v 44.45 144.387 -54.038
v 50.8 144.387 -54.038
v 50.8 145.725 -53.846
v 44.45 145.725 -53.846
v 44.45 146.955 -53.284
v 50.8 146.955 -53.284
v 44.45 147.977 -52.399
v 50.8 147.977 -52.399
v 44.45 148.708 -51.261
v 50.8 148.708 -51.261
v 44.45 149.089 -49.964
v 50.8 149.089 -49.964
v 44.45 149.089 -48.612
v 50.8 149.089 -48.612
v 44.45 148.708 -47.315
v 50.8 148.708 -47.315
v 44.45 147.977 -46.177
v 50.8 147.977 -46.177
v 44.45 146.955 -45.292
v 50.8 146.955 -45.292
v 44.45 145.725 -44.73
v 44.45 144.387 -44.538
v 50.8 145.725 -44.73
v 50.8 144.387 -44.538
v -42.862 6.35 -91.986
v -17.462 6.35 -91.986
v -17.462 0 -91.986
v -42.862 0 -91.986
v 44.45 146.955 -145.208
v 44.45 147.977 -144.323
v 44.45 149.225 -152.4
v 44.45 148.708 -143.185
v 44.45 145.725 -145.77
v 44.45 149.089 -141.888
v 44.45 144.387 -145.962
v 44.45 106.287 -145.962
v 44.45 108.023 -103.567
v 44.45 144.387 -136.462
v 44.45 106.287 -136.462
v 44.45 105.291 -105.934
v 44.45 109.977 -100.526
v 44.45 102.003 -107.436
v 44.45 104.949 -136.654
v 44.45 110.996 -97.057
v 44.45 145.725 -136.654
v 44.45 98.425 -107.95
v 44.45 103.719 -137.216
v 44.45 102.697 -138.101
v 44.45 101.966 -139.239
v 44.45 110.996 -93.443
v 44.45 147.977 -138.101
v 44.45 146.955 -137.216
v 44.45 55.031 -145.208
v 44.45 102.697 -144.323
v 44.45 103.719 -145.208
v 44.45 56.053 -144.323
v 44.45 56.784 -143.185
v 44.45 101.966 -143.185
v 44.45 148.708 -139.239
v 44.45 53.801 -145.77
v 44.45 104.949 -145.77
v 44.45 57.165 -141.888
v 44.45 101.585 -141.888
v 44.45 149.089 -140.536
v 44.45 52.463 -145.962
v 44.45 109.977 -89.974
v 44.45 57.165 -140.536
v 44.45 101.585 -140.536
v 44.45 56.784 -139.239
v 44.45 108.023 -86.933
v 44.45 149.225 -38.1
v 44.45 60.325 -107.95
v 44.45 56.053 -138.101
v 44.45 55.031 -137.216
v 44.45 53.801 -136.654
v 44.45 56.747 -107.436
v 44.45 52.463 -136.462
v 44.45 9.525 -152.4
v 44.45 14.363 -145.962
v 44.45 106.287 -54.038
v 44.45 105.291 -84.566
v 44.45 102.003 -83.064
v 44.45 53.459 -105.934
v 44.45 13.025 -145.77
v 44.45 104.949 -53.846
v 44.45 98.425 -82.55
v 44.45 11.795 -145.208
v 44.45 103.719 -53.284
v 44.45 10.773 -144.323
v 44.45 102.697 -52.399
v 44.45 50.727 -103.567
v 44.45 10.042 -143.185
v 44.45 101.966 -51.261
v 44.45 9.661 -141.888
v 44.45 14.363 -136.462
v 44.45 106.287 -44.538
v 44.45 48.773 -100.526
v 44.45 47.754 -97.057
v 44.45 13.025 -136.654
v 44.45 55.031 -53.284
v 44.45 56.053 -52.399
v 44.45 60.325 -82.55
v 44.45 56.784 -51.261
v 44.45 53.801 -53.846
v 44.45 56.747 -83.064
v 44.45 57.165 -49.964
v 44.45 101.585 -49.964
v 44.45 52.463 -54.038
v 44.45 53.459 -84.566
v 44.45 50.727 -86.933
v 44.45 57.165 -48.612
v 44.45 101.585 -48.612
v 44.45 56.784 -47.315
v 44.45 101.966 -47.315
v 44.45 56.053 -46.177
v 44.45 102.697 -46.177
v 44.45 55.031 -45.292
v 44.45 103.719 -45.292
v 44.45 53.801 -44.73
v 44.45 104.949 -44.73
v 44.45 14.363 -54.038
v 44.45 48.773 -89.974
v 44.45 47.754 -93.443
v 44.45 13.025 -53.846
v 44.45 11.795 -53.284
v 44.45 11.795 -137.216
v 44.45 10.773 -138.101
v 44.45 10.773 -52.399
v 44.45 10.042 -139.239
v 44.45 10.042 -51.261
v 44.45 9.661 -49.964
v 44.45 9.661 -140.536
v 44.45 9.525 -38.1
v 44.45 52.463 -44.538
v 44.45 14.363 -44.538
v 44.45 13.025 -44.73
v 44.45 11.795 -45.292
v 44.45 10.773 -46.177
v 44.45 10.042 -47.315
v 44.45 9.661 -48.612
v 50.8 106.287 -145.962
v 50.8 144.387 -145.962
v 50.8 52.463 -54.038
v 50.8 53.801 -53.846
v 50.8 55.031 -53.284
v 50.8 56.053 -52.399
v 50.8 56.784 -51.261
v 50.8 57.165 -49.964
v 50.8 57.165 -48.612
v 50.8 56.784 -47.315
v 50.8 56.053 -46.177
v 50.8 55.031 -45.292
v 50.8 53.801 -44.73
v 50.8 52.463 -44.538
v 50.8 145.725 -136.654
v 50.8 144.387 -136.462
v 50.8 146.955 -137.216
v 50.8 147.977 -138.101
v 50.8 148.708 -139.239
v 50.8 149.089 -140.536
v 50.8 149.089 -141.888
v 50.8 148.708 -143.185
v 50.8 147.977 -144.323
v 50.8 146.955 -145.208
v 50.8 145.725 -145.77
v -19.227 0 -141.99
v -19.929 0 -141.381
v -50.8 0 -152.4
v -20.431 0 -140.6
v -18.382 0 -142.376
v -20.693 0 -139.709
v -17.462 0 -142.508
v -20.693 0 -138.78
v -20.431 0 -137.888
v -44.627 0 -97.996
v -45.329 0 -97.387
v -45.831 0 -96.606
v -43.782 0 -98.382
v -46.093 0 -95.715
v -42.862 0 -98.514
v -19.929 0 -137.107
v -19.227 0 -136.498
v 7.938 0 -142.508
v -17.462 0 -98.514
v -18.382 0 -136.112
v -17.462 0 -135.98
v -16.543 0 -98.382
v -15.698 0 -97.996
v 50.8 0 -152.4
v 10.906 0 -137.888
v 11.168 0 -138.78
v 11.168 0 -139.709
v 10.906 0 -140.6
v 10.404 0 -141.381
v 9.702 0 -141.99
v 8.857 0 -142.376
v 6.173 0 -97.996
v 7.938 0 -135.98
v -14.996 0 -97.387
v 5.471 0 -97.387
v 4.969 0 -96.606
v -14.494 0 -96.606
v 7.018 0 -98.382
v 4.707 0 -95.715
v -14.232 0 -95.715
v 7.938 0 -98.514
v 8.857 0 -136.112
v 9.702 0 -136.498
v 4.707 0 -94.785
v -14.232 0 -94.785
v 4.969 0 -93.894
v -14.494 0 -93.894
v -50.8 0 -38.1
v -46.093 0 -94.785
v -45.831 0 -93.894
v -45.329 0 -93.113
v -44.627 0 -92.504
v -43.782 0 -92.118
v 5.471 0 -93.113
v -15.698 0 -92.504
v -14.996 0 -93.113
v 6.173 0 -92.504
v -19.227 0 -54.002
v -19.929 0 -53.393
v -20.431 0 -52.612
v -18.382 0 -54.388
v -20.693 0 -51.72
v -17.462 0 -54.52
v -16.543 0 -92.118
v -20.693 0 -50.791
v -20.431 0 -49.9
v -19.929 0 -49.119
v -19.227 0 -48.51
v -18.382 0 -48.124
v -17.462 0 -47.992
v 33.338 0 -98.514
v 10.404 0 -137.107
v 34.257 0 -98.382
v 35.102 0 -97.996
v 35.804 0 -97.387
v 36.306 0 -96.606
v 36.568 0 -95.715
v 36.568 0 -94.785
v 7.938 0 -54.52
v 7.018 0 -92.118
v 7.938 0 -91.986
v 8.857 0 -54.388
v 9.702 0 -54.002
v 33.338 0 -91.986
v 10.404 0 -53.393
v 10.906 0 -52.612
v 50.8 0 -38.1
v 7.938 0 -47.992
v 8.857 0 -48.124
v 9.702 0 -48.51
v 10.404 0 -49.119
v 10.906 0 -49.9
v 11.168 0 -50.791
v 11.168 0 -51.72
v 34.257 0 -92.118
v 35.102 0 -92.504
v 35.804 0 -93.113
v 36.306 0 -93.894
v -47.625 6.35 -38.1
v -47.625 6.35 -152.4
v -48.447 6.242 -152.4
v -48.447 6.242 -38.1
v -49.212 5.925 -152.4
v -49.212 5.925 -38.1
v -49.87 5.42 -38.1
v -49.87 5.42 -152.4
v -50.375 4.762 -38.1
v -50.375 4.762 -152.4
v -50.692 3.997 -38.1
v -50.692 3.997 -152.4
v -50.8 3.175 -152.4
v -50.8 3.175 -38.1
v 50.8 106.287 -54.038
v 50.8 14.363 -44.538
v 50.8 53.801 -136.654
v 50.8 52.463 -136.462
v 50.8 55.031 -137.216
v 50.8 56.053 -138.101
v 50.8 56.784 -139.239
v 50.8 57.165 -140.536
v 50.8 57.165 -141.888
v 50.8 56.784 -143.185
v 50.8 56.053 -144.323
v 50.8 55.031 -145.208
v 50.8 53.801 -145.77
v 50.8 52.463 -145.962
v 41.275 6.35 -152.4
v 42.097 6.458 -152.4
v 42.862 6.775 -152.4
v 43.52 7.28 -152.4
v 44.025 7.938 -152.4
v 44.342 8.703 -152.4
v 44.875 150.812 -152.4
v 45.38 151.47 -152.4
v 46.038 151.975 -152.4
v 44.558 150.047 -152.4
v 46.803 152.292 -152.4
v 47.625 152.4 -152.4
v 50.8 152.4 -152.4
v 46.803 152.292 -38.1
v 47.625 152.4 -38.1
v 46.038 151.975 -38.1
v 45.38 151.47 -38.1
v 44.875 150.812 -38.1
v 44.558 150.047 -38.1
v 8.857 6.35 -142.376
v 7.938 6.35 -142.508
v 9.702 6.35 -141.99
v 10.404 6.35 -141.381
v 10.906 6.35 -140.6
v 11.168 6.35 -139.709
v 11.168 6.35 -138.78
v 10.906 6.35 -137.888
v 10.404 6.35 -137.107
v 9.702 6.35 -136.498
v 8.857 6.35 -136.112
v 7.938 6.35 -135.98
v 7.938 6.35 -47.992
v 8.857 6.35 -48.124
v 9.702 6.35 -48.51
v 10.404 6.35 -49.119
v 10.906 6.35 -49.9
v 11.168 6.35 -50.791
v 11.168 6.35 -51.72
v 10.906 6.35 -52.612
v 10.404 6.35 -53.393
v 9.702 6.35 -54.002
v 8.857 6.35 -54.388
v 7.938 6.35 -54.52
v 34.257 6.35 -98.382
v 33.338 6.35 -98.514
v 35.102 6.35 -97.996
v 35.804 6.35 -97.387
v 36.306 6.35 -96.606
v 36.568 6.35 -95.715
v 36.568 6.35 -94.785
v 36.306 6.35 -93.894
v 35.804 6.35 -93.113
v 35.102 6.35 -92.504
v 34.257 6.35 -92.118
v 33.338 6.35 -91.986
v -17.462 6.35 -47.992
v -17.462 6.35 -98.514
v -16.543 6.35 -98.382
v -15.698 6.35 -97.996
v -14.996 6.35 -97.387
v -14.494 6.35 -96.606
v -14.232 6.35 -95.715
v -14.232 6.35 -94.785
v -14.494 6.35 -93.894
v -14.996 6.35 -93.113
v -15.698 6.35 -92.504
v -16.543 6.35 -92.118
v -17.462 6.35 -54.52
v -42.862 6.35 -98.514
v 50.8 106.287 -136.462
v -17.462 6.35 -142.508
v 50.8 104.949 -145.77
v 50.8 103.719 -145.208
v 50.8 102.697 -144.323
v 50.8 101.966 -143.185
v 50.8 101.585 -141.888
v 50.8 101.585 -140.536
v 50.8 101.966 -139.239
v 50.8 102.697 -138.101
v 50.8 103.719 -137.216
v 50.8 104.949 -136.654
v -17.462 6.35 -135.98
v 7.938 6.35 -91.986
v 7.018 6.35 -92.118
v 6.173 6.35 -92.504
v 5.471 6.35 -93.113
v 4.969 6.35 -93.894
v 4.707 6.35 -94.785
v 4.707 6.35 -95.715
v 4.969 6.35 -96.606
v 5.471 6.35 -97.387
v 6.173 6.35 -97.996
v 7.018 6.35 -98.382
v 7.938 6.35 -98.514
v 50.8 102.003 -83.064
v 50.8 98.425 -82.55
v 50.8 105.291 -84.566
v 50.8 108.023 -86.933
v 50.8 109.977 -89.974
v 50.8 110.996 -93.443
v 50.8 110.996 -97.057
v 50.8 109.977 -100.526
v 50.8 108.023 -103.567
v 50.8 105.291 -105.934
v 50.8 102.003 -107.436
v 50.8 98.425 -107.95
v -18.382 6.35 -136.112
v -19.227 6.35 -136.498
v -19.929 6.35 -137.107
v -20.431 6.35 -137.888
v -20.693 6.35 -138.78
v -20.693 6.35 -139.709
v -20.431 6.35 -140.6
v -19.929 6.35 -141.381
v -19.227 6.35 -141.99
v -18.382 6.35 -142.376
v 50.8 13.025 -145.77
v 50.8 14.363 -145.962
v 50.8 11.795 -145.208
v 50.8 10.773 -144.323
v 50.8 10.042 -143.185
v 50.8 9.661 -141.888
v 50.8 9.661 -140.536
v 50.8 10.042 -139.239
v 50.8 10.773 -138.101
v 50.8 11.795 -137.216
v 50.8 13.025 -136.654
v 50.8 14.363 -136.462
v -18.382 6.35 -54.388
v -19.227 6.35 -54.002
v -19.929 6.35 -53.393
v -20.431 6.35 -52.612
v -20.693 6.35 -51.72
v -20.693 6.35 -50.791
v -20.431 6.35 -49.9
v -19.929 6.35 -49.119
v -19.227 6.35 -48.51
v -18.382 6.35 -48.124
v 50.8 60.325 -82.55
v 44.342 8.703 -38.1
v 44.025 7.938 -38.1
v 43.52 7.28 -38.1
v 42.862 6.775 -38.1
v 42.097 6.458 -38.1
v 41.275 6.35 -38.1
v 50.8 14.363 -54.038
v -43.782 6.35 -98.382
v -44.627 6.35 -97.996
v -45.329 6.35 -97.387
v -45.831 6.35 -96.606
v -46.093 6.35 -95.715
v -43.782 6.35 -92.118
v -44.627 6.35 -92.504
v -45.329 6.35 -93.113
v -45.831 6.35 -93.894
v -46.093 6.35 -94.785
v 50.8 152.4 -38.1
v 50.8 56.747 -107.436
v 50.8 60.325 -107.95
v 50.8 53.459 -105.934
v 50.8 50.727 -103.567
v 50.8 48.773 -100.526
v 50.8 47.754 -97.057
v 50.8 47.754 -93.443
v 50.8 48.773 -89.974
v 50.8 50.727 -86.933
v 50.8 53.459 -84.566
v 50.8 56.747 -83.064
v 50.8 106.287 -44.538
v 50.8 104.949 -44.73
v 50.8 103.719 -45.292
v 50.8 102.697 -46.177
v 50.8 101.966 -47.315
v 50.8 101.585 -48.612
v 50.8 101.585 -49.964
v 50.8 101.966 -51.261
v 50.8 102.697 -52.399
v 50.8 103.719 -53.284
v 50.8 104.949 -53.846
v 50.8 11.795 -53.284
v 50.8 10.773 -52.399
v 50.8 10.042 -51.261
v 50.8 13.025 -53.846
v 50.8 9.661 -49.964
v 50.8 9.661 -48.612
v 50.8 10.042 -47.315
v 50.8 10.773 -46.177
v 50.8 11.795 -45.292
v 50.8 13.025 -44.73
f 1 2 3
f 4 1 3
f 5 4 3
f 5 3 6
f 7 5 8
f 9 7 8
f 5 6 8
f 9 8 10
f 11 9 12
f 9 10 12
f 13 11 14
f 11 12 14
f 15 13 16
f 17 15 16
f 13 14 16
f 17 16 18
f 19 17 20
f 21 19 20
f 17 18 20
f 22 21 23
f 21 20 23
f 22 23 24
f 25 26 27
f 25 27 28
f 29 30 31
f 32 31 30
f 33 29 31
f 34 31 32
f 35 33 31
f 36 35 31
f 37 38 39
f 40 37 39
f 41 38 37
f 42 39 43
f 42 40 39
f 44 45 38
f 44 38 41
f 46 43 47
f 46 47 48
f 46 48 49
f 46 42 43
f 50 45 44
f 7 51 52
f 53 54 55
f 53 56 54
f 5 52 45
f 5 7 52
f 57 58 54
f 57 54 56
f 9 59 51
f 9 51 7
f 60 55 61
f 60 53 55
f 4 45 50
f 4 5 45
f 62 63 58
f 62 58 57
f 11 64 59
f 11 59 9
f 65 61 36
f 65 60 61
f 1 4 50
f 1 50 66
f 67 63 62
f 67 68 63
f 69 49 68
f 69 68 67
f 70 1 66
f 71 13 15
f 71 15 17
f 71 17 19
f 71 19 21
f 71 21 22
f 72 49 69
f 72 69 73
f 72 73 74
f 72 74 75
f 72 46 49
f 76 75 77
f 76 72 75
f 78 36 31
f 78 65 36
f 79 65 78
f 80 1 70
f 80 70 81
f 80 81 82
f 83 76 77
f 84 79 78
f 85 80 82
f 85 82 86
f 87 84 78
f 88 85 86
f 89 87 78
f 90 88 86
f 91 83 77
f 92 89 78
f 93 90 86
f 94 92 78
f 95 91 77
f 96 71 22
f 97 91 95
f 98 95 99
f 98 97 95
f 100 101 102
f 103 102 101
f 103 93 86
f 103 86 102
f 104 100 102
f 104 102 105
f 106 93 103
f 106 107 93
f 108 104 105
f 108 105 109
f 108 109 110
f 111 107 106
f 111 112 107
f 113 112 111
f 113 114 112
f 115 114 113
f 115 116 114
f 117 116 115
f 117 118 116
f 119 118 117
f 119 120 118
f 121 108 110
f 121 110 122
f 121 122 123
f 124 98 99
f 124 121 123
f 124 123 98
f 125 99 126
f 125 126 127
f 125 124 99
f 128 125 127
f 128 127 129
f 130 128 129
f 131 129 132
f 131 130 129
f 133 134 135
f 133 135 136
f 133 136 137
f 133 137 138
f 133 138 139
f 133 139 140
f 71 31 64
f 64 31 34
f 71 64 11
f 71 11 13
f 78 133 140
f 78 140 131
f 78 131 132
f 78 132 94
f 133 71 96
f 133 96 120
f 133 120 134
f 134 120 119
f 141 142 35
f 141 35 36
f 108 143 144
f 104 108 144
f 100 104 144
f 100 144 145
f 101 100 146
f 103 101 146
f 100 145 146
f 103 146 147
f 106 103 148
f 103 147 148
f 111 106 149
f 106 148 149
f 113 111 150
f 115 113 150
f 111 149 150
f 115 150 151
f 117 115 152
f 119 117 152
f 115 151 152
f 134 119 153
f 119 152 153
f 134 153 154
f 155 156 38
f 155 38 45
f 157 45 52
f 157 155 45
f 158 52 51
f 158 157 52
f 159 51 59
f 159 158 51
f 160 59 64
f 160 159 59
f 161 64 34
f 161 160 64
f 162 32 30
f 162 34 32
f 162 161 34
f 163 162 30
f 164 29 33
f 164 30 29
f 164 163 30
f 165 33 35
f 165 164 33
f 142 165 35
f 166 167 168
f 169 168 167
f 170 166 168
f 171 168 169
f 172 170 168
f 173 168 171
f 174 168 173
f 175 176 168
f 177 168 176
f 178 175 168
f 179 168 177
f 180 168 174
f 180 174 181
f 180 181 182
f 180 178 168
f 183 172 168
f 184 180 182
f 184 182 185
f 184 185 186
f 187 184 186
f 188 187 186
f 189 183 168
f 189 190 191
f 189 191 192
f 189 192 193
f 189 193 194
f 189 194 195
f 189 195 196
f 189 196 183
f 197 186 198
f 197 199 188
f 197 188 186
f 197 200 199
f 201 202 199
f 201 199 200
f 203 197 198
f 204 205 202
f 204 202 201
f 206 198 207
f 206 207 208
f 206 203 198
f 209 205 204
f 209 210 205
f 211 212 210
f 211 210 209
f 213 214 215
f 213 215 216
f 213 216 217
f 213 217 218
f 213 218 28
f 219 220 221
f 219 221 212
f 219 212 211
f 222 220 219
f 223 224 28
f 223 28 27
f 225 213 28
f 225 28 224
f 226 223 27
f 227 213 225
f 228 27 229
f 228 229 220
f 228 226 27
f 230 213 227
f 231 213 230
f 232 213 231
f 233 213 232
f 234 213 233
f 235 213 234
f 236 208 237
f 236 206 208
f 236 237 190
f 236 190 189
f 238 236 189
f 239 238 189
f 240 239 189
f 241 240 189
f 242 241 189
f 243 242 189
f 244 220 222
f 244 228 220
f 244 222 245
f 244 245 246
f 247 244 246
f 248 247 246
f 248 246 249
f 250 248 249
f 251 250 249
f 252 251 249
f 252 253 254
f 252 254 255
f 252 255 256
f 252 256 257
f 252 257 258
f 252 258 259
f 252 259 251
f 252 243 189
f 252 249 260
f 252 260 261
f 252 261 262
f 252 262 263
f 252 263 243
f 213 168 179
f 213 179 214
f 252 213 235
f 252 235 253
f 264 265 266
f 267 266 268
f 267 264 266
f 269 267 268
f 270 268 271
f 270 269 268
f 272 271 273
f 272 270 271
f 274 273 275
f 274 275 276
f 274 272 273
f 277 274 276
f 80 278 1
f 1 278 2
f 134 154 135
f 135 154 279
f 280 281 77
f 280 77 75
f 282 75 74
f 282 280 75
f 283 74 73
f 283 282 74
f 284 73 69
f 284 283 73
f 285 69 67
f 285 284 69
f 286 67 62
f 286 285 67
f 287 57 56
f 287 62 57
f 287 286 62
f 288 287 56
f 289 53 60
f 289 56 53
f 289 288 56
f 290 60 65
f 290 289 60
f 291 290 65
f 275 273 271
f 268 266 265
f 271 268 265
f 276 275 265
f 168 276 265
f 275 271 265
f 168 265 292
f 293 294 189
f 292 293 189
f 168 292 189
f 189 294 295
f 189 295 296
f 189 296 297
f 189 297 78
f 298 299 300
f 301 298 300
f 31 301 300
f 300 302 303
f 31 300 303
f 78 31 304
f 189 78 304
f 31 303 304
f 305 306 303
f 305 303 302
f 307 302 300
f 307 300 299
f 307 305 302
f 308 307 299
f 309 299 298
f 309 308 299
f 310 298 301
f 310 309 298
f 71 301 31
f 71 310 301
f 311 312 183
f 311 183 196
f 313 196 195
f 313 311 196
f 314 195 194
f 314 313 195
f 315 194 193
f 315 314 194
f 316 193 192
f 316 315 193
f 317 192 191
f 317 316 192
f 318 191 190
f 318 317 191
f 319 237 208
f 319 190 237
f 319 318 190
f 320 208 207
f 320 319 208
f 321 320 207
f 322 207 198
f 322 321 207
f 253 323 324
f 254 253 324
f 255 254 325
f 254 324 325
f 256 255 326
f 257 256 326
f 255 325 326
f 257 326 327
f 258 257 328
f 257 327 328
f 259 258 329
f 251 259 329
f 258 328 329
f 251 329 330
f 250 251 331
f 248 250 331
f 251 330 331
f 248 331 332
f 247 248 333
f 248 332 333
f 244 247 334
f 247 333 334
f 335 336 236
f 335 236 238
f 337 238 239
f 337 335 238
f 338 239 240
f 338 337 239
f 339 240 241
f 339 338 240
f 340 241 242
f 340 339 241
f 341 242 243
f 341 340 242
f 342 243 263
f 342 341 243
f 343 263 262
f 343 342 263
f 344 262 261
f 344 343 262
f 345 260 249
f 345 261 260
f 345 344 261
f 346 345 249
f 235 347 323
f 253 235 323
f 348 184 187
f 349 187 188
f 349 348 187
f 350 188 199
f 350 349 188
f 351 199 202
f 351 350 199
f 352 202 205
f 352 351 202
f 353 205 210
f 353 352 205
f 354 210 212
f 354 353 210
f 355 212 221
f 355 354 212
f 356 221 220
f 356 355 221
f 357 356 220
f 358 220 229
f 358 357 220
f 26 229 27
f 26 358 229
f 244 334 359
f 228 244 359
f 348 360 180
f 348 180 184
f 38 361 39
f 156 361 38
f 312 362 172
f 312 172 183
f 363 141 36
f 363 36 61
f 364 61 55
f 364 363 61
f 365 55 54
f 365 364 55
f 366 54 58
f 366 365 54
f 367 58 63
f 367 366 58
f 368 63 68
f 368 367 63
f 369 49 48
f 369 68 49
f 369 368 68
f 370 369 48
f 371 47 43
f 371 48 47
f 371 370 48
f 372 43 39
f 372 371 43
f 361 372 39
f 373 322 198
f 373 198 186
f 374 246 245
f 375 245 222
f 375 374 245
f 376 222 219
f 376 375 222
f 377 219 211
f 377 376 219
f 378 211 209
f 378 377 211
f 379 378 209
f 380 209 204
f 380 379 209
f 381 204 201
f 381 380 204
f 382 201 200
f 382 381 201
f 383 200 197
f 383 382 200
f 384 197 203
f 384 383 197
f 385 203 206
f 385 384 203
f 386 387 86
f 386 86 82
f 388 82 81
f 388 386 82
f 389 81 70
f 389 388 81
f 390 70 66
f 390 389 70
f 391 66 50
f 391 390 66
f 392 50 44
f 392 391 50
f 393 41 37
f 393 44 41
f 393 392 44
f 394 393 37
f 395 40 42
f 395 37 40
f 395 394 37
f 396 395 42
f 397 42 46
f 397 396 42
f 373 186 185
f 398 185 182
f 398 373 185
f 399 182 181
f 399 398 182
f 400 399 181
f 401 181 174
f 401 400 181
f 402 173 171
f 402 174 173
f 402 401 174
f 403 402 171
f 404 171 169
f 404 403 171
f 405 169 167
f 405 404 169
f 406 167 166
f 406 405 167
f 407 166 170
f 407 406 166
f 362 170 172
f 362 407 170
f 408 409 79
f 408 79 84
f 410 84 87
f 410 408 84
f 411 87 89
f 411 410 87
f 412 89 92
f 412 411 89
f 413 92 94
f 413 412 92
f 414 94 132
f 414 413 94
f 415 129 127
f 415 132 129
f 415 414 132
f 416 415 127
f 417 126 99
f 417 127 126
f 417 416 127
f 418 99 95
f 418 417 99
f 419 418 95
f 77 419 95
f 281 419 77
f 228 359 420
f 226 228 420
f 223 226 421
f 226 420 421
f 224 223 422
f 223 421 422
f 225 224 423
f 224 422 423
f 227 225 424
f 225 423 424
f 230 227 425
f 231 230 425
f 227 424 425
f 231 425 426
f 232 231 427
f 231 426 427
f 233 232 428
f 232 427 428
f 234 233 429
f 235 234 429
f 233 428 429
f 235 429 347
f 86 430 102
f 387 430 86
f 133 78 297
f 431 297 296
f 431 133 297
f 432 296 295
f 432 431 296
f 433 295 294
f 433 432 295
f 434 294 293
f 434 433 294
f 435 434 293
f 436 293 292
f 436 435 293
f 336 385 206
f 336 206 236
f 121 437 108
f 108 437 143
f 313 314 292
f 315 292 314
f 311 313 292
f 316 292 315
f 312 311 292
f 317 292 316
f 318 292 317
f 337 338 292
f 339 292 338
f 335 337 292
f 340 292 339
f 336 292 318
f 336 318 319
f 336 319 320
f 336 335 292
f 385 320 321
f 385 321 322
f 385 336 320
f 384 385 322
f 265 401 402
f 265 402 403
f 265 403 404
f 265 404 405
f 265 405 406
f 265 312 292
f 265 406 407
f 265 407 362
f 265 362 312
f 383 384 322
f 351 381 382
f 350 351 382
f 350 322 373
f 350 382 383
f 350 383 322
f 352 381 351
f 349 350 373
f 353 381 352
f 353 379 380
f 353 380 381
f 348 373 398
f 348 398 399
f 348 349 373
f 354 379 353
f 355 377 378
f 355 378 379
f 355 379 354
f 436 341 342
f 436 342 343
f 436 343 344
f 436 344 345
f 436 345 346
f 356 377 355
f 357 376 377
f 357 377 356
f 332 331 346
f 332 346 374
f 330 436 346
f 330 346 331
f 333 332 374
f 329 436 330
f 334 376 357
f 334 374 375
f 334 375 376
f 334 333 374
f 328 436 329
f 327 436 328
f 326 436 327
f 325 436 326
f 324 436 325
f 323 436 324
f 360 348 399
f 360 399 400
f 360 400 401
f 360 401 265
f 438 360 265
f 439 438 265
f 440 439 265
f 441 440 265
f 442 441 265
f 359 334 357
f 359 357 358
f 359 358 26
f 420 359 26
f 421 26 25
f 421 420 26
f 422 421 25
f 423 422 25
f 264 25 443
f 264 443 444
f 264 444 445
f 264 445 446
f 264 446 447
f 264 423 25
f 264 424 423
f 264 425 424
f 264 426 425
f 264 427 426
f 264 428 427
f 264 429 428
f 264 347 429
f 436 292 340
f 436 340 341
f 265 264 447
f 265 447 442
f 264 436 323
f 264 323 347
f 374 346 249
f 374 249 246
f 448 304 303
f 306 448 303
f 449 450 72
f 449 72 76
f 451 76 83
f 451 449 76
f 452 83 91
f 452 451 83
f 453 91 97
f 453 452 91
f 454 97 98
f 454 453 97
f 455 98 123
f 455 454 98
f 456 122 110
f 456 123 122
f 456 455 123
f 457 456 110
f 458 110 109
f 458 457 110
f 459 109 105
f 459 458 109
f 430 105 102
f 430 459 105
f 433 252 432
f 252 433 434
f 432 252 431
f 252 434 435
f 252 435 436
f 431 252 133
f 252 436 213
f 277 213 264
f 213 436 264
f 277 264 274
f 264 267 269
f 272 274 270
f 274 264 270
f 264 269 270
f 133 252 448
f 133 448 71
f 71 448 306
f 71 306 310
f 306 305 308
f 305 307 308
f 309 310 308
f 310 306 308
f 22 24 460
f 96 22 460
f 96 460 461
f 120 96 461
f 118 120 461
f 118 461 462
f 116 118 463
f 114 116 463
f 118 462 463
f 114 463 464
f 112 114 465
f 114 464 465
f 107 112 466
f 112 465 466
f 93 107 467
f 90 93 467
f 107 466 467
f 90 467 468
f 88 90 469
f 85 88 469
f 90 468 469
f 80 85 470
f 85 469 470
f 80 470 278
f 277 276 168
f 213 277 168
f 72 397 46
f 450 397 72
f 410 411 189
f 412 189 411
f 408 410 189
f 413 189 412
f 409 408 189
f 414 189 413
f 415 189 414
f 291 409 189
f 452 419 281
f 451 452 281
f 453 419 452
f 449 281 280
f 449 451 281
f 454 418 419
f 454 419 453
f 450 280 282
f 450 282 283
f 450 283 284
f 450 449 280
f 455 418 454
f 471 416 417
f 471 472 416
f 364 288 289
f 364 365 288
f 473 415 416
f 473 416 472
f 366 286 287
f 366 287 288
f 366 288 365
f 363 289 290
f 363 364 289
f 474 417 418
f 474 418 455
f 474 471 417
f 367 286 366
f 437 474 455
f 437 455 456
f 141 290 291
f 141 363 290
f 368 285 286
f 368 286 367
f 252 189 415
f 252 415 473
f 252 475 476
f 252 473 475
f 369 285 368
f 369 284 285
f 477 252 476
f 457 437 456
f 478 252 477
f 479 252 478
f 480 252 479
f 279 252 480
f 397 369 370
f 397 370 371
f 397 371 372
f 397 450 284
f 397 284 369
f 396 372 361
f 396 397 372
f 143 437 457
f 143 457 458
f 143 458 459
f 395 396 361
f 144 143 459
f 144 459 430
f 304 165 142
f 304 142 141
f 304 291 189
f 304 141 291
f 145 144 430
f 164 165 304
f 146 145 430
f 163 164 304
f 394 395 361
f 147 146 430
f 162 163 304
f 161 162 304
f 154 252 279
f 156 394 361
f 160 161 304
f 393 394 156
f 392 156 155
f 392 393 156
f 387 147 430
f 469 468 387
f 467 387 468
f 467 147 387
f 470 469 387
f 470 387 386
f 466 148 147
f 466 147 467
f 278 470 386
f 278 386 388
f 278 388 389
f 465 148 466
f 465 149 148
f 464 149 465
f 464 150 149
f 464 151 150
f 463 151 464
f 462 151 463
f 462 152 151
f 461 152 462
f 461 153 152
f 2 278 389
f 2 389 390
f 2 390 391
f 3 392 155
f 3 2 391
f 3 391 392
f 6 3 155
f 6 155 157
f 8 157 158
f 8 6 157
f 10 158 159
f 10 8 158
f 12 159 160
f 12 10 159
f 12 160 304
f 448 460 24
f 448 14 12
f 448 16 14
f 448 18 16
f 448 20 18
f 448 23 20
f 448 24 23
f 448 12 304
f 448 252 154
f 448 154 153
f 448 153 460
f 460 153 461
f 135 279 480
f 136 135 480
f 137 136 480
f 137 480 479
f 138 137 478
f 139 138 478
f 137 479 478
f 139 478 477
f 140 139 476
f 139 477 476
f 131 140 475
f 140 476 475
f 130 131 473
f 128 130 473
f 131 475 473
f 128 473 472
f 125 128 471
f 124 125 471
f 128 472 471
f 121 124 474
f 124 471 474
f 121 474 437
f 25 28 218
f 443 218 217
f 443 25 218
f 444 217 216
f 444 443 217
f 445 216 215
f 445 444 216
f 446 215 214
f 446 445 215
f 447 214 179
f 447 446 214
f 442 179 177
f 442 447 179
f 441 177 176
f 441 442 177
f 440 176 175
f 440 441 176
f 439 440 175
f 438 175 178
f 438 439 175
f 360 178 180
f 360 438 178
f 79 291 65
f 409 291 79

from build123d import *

# Parameters (mm, degrees)
BOSS_EXTRUDE1_DEPTH = 152.4
CUT_EXTRUDE1_DEPTH  = 239.273120599
CUT_EXTRUDE2_DEPTH  = 218.110576665


with BuildPart() as part:
    # Sketch2 → Boss-Extrude1 (new, symmetric)
    with BuildSketch(Plane.XY):
        with BuildLine():
            Line((-50.8, 0), (50.8, 0))
            Line((50.8, 0), (50.8, 152.4))
            Line((50.8, 152.4), (47.625, 152.4))
            ThreePointArc((47.625, 152.4), (45.37993597, 151.47006403), (44.45, 149.225))
            Line((44.45, 149.225), (44.45, 9.525))
            ThreePointArc((44.45, 9.525), (43.52006403, 7.27993597), (41.275, 6.35))
            Line((41.275, 6.35), (-47.625, 6.35))
            ThreePointArc((-47.625, 6.35), (-49.87006403, 5.42006403), (-50.8, 3.175))
            Line((-50.8, 3.175), (-50.8, 0))
        make_face()
    extrude(amount=BOSS_EXTRUDE1_DEPTH, both=True)

    # SurfaceCut1
    split(bisect_by=Plane(origin=(0, 0, -38.1), x_dir=(-1, 0, 0), z_dir=(0, 0, -1)), keep=Keep.TOP)

    # Sketch3 → Cut-Extrude1 (cut, through all)
    with BuildSketch(Plane(origin=(50.8, 0, 0), x_dir=(0, 0, -1), z_dir=(1, 0, 0))):
        with BuildLine():
            Line((145.961940777, 144.386940777), (145.961940777, 106.286940777))
            ThreePointArc((145.961940777, 106.286940777), (141.211940777, 101.536940777), (136.461940777, 106.286940777))
            Line((136.461940777, 106.286940777), (136.461940777, 144.386940777))
            ThreePointArc((136.461940777, 144.386940777), (141.211940777, 149.136940777), (145.961940777, 144.386940777))
        make_face()
        with BuildLine():
            Line((145.961940777, 52.463059223), (145.961940777, 14.363059223))
            ThreePointArc((145.961940777, 14.363059223), (141.211940777, 9.613059223), (136.461940777, 14.363059223))
            Line((136.461940777, 14.363059223), (136.461940777, 52.463059223))
            ThreePointArc((136.461940777, 52.463059223), (141.211940777, 57.213059223), (145.961940777, 52.463059223))
        make_face()
        with BuildLine():
            Line((44.538059223, 52.463059223), (44.538059223, 14.363059223))
            ThreePointArc((44.538059223, 14.363059223), (49.288059223, 9.613059223), (54.038059223, 14.363059223))
            Line((54.038059223, 14.363059223), (54.038059223, 52.463059223))
            ThreePointArc((54.038059223, 52.463059223), (49.288059223, 57.213059223), (44.538059223, 52.463059223))
        make_face()
        with BuildLine():
            Line((44.538059223, 144.386940777), (44.538059223, 106.286940777))
            ThreePointArc((44.538059223, 106.286940777), (49.288059223, 101.536940777), (54.038059223, 106.286940777))
            Line((54.038059223, 106.286940777), (54.038059223, 144.386940777))
            ThreePointArc((54.038059223, 144.386940777), (49.288059223, 149.136940777), (44.538059223, 144.386940777))
        make_face()
        with BuildLine():
            Line((107.95, 98.425), (107.95, 60.325))
            ThreePointArc((107.95, 60.325), (95.25, 47.625), (82.55, 60.325))
            Line((82.55, 60.325), (82.55, 98.425))
            ThreePointArc((82.55, 98.425), (95.25, 111.125), (107.95, 98.425))
        make_face()
    extrude(amount=-CUT_EXTRUDE1_DEPTH, mode=Mode.SUBTRACT)

    # Sketch4 → Cut-Extrude2 (cut, through all)
    with BuildSketch(Plane(origin=(0, 6.35, 0), x_dir=(1, 0, 0), z_dir=(0, 1, 0))):
        with BuildLine():
            Line((-42.8625, 98.5139), (-17.4625, 98.5139))
            ThreePointArc((-17.4625, 98.5139), (-14.1986, 95.25), (-17.4625, 91.9861))
            Line((-17.4625, 91.9861), (-42.8625, 91.9861))
            ThreePointArc((-42.8625, 91.9861), (-46.1264, 95.25), (-42.8625, 98.5139))
        make_face()
        with BuildLine():
            Line((7.9375, 98.5139), (33.3375, 98.5139))
            ThreePointArc((33.3375, 98.5139), (36.6014, 95.25), (33.3375, 91.9861))
            Line((33.3375, 91.9861), (7.9375, 91.9861))
            ThreePointArc((7.9375, 91.9861), (4.6736, 95.25), (7.9375, 98.5139))
        make_face()
        with BuildLine():
            Line((-17.4625, 142.507990512), (7.9375, 142.507990512))
            ThreePointArc((7.9375, 142.507990512), (11.2014, 139.244090512), (7.9375, 135.980190512))
            Line((7.9375, 135.980190512), (-17.4625, 135.980190512))
            ThreePointArc((-17.4625, 135.980190512), (-20.7264, 139.244090512), (-17.4625, 142.507990512))
        make_face()
        with BuildLine():
            Line((-17.4625, 47.992009488), (7.9375, 47.992009488))
            ThreePointArc((7.9375, 47.992009488), (11.2014, 51.255909488), (7.9375, 54.519809488))
            Line((7.9375, 54.519809488), (-17.4625, 54.519809488))
            ThreePointArc((-17.4625, 54.519809488), (-20.7264, 51.255909488), (-17.4625, 47.992009488))
        make_face()
    extrude(amount=-CUT_EXTRUDE2_DEPTH, mode=Mode.SUBTRACT)


solid = part.part
